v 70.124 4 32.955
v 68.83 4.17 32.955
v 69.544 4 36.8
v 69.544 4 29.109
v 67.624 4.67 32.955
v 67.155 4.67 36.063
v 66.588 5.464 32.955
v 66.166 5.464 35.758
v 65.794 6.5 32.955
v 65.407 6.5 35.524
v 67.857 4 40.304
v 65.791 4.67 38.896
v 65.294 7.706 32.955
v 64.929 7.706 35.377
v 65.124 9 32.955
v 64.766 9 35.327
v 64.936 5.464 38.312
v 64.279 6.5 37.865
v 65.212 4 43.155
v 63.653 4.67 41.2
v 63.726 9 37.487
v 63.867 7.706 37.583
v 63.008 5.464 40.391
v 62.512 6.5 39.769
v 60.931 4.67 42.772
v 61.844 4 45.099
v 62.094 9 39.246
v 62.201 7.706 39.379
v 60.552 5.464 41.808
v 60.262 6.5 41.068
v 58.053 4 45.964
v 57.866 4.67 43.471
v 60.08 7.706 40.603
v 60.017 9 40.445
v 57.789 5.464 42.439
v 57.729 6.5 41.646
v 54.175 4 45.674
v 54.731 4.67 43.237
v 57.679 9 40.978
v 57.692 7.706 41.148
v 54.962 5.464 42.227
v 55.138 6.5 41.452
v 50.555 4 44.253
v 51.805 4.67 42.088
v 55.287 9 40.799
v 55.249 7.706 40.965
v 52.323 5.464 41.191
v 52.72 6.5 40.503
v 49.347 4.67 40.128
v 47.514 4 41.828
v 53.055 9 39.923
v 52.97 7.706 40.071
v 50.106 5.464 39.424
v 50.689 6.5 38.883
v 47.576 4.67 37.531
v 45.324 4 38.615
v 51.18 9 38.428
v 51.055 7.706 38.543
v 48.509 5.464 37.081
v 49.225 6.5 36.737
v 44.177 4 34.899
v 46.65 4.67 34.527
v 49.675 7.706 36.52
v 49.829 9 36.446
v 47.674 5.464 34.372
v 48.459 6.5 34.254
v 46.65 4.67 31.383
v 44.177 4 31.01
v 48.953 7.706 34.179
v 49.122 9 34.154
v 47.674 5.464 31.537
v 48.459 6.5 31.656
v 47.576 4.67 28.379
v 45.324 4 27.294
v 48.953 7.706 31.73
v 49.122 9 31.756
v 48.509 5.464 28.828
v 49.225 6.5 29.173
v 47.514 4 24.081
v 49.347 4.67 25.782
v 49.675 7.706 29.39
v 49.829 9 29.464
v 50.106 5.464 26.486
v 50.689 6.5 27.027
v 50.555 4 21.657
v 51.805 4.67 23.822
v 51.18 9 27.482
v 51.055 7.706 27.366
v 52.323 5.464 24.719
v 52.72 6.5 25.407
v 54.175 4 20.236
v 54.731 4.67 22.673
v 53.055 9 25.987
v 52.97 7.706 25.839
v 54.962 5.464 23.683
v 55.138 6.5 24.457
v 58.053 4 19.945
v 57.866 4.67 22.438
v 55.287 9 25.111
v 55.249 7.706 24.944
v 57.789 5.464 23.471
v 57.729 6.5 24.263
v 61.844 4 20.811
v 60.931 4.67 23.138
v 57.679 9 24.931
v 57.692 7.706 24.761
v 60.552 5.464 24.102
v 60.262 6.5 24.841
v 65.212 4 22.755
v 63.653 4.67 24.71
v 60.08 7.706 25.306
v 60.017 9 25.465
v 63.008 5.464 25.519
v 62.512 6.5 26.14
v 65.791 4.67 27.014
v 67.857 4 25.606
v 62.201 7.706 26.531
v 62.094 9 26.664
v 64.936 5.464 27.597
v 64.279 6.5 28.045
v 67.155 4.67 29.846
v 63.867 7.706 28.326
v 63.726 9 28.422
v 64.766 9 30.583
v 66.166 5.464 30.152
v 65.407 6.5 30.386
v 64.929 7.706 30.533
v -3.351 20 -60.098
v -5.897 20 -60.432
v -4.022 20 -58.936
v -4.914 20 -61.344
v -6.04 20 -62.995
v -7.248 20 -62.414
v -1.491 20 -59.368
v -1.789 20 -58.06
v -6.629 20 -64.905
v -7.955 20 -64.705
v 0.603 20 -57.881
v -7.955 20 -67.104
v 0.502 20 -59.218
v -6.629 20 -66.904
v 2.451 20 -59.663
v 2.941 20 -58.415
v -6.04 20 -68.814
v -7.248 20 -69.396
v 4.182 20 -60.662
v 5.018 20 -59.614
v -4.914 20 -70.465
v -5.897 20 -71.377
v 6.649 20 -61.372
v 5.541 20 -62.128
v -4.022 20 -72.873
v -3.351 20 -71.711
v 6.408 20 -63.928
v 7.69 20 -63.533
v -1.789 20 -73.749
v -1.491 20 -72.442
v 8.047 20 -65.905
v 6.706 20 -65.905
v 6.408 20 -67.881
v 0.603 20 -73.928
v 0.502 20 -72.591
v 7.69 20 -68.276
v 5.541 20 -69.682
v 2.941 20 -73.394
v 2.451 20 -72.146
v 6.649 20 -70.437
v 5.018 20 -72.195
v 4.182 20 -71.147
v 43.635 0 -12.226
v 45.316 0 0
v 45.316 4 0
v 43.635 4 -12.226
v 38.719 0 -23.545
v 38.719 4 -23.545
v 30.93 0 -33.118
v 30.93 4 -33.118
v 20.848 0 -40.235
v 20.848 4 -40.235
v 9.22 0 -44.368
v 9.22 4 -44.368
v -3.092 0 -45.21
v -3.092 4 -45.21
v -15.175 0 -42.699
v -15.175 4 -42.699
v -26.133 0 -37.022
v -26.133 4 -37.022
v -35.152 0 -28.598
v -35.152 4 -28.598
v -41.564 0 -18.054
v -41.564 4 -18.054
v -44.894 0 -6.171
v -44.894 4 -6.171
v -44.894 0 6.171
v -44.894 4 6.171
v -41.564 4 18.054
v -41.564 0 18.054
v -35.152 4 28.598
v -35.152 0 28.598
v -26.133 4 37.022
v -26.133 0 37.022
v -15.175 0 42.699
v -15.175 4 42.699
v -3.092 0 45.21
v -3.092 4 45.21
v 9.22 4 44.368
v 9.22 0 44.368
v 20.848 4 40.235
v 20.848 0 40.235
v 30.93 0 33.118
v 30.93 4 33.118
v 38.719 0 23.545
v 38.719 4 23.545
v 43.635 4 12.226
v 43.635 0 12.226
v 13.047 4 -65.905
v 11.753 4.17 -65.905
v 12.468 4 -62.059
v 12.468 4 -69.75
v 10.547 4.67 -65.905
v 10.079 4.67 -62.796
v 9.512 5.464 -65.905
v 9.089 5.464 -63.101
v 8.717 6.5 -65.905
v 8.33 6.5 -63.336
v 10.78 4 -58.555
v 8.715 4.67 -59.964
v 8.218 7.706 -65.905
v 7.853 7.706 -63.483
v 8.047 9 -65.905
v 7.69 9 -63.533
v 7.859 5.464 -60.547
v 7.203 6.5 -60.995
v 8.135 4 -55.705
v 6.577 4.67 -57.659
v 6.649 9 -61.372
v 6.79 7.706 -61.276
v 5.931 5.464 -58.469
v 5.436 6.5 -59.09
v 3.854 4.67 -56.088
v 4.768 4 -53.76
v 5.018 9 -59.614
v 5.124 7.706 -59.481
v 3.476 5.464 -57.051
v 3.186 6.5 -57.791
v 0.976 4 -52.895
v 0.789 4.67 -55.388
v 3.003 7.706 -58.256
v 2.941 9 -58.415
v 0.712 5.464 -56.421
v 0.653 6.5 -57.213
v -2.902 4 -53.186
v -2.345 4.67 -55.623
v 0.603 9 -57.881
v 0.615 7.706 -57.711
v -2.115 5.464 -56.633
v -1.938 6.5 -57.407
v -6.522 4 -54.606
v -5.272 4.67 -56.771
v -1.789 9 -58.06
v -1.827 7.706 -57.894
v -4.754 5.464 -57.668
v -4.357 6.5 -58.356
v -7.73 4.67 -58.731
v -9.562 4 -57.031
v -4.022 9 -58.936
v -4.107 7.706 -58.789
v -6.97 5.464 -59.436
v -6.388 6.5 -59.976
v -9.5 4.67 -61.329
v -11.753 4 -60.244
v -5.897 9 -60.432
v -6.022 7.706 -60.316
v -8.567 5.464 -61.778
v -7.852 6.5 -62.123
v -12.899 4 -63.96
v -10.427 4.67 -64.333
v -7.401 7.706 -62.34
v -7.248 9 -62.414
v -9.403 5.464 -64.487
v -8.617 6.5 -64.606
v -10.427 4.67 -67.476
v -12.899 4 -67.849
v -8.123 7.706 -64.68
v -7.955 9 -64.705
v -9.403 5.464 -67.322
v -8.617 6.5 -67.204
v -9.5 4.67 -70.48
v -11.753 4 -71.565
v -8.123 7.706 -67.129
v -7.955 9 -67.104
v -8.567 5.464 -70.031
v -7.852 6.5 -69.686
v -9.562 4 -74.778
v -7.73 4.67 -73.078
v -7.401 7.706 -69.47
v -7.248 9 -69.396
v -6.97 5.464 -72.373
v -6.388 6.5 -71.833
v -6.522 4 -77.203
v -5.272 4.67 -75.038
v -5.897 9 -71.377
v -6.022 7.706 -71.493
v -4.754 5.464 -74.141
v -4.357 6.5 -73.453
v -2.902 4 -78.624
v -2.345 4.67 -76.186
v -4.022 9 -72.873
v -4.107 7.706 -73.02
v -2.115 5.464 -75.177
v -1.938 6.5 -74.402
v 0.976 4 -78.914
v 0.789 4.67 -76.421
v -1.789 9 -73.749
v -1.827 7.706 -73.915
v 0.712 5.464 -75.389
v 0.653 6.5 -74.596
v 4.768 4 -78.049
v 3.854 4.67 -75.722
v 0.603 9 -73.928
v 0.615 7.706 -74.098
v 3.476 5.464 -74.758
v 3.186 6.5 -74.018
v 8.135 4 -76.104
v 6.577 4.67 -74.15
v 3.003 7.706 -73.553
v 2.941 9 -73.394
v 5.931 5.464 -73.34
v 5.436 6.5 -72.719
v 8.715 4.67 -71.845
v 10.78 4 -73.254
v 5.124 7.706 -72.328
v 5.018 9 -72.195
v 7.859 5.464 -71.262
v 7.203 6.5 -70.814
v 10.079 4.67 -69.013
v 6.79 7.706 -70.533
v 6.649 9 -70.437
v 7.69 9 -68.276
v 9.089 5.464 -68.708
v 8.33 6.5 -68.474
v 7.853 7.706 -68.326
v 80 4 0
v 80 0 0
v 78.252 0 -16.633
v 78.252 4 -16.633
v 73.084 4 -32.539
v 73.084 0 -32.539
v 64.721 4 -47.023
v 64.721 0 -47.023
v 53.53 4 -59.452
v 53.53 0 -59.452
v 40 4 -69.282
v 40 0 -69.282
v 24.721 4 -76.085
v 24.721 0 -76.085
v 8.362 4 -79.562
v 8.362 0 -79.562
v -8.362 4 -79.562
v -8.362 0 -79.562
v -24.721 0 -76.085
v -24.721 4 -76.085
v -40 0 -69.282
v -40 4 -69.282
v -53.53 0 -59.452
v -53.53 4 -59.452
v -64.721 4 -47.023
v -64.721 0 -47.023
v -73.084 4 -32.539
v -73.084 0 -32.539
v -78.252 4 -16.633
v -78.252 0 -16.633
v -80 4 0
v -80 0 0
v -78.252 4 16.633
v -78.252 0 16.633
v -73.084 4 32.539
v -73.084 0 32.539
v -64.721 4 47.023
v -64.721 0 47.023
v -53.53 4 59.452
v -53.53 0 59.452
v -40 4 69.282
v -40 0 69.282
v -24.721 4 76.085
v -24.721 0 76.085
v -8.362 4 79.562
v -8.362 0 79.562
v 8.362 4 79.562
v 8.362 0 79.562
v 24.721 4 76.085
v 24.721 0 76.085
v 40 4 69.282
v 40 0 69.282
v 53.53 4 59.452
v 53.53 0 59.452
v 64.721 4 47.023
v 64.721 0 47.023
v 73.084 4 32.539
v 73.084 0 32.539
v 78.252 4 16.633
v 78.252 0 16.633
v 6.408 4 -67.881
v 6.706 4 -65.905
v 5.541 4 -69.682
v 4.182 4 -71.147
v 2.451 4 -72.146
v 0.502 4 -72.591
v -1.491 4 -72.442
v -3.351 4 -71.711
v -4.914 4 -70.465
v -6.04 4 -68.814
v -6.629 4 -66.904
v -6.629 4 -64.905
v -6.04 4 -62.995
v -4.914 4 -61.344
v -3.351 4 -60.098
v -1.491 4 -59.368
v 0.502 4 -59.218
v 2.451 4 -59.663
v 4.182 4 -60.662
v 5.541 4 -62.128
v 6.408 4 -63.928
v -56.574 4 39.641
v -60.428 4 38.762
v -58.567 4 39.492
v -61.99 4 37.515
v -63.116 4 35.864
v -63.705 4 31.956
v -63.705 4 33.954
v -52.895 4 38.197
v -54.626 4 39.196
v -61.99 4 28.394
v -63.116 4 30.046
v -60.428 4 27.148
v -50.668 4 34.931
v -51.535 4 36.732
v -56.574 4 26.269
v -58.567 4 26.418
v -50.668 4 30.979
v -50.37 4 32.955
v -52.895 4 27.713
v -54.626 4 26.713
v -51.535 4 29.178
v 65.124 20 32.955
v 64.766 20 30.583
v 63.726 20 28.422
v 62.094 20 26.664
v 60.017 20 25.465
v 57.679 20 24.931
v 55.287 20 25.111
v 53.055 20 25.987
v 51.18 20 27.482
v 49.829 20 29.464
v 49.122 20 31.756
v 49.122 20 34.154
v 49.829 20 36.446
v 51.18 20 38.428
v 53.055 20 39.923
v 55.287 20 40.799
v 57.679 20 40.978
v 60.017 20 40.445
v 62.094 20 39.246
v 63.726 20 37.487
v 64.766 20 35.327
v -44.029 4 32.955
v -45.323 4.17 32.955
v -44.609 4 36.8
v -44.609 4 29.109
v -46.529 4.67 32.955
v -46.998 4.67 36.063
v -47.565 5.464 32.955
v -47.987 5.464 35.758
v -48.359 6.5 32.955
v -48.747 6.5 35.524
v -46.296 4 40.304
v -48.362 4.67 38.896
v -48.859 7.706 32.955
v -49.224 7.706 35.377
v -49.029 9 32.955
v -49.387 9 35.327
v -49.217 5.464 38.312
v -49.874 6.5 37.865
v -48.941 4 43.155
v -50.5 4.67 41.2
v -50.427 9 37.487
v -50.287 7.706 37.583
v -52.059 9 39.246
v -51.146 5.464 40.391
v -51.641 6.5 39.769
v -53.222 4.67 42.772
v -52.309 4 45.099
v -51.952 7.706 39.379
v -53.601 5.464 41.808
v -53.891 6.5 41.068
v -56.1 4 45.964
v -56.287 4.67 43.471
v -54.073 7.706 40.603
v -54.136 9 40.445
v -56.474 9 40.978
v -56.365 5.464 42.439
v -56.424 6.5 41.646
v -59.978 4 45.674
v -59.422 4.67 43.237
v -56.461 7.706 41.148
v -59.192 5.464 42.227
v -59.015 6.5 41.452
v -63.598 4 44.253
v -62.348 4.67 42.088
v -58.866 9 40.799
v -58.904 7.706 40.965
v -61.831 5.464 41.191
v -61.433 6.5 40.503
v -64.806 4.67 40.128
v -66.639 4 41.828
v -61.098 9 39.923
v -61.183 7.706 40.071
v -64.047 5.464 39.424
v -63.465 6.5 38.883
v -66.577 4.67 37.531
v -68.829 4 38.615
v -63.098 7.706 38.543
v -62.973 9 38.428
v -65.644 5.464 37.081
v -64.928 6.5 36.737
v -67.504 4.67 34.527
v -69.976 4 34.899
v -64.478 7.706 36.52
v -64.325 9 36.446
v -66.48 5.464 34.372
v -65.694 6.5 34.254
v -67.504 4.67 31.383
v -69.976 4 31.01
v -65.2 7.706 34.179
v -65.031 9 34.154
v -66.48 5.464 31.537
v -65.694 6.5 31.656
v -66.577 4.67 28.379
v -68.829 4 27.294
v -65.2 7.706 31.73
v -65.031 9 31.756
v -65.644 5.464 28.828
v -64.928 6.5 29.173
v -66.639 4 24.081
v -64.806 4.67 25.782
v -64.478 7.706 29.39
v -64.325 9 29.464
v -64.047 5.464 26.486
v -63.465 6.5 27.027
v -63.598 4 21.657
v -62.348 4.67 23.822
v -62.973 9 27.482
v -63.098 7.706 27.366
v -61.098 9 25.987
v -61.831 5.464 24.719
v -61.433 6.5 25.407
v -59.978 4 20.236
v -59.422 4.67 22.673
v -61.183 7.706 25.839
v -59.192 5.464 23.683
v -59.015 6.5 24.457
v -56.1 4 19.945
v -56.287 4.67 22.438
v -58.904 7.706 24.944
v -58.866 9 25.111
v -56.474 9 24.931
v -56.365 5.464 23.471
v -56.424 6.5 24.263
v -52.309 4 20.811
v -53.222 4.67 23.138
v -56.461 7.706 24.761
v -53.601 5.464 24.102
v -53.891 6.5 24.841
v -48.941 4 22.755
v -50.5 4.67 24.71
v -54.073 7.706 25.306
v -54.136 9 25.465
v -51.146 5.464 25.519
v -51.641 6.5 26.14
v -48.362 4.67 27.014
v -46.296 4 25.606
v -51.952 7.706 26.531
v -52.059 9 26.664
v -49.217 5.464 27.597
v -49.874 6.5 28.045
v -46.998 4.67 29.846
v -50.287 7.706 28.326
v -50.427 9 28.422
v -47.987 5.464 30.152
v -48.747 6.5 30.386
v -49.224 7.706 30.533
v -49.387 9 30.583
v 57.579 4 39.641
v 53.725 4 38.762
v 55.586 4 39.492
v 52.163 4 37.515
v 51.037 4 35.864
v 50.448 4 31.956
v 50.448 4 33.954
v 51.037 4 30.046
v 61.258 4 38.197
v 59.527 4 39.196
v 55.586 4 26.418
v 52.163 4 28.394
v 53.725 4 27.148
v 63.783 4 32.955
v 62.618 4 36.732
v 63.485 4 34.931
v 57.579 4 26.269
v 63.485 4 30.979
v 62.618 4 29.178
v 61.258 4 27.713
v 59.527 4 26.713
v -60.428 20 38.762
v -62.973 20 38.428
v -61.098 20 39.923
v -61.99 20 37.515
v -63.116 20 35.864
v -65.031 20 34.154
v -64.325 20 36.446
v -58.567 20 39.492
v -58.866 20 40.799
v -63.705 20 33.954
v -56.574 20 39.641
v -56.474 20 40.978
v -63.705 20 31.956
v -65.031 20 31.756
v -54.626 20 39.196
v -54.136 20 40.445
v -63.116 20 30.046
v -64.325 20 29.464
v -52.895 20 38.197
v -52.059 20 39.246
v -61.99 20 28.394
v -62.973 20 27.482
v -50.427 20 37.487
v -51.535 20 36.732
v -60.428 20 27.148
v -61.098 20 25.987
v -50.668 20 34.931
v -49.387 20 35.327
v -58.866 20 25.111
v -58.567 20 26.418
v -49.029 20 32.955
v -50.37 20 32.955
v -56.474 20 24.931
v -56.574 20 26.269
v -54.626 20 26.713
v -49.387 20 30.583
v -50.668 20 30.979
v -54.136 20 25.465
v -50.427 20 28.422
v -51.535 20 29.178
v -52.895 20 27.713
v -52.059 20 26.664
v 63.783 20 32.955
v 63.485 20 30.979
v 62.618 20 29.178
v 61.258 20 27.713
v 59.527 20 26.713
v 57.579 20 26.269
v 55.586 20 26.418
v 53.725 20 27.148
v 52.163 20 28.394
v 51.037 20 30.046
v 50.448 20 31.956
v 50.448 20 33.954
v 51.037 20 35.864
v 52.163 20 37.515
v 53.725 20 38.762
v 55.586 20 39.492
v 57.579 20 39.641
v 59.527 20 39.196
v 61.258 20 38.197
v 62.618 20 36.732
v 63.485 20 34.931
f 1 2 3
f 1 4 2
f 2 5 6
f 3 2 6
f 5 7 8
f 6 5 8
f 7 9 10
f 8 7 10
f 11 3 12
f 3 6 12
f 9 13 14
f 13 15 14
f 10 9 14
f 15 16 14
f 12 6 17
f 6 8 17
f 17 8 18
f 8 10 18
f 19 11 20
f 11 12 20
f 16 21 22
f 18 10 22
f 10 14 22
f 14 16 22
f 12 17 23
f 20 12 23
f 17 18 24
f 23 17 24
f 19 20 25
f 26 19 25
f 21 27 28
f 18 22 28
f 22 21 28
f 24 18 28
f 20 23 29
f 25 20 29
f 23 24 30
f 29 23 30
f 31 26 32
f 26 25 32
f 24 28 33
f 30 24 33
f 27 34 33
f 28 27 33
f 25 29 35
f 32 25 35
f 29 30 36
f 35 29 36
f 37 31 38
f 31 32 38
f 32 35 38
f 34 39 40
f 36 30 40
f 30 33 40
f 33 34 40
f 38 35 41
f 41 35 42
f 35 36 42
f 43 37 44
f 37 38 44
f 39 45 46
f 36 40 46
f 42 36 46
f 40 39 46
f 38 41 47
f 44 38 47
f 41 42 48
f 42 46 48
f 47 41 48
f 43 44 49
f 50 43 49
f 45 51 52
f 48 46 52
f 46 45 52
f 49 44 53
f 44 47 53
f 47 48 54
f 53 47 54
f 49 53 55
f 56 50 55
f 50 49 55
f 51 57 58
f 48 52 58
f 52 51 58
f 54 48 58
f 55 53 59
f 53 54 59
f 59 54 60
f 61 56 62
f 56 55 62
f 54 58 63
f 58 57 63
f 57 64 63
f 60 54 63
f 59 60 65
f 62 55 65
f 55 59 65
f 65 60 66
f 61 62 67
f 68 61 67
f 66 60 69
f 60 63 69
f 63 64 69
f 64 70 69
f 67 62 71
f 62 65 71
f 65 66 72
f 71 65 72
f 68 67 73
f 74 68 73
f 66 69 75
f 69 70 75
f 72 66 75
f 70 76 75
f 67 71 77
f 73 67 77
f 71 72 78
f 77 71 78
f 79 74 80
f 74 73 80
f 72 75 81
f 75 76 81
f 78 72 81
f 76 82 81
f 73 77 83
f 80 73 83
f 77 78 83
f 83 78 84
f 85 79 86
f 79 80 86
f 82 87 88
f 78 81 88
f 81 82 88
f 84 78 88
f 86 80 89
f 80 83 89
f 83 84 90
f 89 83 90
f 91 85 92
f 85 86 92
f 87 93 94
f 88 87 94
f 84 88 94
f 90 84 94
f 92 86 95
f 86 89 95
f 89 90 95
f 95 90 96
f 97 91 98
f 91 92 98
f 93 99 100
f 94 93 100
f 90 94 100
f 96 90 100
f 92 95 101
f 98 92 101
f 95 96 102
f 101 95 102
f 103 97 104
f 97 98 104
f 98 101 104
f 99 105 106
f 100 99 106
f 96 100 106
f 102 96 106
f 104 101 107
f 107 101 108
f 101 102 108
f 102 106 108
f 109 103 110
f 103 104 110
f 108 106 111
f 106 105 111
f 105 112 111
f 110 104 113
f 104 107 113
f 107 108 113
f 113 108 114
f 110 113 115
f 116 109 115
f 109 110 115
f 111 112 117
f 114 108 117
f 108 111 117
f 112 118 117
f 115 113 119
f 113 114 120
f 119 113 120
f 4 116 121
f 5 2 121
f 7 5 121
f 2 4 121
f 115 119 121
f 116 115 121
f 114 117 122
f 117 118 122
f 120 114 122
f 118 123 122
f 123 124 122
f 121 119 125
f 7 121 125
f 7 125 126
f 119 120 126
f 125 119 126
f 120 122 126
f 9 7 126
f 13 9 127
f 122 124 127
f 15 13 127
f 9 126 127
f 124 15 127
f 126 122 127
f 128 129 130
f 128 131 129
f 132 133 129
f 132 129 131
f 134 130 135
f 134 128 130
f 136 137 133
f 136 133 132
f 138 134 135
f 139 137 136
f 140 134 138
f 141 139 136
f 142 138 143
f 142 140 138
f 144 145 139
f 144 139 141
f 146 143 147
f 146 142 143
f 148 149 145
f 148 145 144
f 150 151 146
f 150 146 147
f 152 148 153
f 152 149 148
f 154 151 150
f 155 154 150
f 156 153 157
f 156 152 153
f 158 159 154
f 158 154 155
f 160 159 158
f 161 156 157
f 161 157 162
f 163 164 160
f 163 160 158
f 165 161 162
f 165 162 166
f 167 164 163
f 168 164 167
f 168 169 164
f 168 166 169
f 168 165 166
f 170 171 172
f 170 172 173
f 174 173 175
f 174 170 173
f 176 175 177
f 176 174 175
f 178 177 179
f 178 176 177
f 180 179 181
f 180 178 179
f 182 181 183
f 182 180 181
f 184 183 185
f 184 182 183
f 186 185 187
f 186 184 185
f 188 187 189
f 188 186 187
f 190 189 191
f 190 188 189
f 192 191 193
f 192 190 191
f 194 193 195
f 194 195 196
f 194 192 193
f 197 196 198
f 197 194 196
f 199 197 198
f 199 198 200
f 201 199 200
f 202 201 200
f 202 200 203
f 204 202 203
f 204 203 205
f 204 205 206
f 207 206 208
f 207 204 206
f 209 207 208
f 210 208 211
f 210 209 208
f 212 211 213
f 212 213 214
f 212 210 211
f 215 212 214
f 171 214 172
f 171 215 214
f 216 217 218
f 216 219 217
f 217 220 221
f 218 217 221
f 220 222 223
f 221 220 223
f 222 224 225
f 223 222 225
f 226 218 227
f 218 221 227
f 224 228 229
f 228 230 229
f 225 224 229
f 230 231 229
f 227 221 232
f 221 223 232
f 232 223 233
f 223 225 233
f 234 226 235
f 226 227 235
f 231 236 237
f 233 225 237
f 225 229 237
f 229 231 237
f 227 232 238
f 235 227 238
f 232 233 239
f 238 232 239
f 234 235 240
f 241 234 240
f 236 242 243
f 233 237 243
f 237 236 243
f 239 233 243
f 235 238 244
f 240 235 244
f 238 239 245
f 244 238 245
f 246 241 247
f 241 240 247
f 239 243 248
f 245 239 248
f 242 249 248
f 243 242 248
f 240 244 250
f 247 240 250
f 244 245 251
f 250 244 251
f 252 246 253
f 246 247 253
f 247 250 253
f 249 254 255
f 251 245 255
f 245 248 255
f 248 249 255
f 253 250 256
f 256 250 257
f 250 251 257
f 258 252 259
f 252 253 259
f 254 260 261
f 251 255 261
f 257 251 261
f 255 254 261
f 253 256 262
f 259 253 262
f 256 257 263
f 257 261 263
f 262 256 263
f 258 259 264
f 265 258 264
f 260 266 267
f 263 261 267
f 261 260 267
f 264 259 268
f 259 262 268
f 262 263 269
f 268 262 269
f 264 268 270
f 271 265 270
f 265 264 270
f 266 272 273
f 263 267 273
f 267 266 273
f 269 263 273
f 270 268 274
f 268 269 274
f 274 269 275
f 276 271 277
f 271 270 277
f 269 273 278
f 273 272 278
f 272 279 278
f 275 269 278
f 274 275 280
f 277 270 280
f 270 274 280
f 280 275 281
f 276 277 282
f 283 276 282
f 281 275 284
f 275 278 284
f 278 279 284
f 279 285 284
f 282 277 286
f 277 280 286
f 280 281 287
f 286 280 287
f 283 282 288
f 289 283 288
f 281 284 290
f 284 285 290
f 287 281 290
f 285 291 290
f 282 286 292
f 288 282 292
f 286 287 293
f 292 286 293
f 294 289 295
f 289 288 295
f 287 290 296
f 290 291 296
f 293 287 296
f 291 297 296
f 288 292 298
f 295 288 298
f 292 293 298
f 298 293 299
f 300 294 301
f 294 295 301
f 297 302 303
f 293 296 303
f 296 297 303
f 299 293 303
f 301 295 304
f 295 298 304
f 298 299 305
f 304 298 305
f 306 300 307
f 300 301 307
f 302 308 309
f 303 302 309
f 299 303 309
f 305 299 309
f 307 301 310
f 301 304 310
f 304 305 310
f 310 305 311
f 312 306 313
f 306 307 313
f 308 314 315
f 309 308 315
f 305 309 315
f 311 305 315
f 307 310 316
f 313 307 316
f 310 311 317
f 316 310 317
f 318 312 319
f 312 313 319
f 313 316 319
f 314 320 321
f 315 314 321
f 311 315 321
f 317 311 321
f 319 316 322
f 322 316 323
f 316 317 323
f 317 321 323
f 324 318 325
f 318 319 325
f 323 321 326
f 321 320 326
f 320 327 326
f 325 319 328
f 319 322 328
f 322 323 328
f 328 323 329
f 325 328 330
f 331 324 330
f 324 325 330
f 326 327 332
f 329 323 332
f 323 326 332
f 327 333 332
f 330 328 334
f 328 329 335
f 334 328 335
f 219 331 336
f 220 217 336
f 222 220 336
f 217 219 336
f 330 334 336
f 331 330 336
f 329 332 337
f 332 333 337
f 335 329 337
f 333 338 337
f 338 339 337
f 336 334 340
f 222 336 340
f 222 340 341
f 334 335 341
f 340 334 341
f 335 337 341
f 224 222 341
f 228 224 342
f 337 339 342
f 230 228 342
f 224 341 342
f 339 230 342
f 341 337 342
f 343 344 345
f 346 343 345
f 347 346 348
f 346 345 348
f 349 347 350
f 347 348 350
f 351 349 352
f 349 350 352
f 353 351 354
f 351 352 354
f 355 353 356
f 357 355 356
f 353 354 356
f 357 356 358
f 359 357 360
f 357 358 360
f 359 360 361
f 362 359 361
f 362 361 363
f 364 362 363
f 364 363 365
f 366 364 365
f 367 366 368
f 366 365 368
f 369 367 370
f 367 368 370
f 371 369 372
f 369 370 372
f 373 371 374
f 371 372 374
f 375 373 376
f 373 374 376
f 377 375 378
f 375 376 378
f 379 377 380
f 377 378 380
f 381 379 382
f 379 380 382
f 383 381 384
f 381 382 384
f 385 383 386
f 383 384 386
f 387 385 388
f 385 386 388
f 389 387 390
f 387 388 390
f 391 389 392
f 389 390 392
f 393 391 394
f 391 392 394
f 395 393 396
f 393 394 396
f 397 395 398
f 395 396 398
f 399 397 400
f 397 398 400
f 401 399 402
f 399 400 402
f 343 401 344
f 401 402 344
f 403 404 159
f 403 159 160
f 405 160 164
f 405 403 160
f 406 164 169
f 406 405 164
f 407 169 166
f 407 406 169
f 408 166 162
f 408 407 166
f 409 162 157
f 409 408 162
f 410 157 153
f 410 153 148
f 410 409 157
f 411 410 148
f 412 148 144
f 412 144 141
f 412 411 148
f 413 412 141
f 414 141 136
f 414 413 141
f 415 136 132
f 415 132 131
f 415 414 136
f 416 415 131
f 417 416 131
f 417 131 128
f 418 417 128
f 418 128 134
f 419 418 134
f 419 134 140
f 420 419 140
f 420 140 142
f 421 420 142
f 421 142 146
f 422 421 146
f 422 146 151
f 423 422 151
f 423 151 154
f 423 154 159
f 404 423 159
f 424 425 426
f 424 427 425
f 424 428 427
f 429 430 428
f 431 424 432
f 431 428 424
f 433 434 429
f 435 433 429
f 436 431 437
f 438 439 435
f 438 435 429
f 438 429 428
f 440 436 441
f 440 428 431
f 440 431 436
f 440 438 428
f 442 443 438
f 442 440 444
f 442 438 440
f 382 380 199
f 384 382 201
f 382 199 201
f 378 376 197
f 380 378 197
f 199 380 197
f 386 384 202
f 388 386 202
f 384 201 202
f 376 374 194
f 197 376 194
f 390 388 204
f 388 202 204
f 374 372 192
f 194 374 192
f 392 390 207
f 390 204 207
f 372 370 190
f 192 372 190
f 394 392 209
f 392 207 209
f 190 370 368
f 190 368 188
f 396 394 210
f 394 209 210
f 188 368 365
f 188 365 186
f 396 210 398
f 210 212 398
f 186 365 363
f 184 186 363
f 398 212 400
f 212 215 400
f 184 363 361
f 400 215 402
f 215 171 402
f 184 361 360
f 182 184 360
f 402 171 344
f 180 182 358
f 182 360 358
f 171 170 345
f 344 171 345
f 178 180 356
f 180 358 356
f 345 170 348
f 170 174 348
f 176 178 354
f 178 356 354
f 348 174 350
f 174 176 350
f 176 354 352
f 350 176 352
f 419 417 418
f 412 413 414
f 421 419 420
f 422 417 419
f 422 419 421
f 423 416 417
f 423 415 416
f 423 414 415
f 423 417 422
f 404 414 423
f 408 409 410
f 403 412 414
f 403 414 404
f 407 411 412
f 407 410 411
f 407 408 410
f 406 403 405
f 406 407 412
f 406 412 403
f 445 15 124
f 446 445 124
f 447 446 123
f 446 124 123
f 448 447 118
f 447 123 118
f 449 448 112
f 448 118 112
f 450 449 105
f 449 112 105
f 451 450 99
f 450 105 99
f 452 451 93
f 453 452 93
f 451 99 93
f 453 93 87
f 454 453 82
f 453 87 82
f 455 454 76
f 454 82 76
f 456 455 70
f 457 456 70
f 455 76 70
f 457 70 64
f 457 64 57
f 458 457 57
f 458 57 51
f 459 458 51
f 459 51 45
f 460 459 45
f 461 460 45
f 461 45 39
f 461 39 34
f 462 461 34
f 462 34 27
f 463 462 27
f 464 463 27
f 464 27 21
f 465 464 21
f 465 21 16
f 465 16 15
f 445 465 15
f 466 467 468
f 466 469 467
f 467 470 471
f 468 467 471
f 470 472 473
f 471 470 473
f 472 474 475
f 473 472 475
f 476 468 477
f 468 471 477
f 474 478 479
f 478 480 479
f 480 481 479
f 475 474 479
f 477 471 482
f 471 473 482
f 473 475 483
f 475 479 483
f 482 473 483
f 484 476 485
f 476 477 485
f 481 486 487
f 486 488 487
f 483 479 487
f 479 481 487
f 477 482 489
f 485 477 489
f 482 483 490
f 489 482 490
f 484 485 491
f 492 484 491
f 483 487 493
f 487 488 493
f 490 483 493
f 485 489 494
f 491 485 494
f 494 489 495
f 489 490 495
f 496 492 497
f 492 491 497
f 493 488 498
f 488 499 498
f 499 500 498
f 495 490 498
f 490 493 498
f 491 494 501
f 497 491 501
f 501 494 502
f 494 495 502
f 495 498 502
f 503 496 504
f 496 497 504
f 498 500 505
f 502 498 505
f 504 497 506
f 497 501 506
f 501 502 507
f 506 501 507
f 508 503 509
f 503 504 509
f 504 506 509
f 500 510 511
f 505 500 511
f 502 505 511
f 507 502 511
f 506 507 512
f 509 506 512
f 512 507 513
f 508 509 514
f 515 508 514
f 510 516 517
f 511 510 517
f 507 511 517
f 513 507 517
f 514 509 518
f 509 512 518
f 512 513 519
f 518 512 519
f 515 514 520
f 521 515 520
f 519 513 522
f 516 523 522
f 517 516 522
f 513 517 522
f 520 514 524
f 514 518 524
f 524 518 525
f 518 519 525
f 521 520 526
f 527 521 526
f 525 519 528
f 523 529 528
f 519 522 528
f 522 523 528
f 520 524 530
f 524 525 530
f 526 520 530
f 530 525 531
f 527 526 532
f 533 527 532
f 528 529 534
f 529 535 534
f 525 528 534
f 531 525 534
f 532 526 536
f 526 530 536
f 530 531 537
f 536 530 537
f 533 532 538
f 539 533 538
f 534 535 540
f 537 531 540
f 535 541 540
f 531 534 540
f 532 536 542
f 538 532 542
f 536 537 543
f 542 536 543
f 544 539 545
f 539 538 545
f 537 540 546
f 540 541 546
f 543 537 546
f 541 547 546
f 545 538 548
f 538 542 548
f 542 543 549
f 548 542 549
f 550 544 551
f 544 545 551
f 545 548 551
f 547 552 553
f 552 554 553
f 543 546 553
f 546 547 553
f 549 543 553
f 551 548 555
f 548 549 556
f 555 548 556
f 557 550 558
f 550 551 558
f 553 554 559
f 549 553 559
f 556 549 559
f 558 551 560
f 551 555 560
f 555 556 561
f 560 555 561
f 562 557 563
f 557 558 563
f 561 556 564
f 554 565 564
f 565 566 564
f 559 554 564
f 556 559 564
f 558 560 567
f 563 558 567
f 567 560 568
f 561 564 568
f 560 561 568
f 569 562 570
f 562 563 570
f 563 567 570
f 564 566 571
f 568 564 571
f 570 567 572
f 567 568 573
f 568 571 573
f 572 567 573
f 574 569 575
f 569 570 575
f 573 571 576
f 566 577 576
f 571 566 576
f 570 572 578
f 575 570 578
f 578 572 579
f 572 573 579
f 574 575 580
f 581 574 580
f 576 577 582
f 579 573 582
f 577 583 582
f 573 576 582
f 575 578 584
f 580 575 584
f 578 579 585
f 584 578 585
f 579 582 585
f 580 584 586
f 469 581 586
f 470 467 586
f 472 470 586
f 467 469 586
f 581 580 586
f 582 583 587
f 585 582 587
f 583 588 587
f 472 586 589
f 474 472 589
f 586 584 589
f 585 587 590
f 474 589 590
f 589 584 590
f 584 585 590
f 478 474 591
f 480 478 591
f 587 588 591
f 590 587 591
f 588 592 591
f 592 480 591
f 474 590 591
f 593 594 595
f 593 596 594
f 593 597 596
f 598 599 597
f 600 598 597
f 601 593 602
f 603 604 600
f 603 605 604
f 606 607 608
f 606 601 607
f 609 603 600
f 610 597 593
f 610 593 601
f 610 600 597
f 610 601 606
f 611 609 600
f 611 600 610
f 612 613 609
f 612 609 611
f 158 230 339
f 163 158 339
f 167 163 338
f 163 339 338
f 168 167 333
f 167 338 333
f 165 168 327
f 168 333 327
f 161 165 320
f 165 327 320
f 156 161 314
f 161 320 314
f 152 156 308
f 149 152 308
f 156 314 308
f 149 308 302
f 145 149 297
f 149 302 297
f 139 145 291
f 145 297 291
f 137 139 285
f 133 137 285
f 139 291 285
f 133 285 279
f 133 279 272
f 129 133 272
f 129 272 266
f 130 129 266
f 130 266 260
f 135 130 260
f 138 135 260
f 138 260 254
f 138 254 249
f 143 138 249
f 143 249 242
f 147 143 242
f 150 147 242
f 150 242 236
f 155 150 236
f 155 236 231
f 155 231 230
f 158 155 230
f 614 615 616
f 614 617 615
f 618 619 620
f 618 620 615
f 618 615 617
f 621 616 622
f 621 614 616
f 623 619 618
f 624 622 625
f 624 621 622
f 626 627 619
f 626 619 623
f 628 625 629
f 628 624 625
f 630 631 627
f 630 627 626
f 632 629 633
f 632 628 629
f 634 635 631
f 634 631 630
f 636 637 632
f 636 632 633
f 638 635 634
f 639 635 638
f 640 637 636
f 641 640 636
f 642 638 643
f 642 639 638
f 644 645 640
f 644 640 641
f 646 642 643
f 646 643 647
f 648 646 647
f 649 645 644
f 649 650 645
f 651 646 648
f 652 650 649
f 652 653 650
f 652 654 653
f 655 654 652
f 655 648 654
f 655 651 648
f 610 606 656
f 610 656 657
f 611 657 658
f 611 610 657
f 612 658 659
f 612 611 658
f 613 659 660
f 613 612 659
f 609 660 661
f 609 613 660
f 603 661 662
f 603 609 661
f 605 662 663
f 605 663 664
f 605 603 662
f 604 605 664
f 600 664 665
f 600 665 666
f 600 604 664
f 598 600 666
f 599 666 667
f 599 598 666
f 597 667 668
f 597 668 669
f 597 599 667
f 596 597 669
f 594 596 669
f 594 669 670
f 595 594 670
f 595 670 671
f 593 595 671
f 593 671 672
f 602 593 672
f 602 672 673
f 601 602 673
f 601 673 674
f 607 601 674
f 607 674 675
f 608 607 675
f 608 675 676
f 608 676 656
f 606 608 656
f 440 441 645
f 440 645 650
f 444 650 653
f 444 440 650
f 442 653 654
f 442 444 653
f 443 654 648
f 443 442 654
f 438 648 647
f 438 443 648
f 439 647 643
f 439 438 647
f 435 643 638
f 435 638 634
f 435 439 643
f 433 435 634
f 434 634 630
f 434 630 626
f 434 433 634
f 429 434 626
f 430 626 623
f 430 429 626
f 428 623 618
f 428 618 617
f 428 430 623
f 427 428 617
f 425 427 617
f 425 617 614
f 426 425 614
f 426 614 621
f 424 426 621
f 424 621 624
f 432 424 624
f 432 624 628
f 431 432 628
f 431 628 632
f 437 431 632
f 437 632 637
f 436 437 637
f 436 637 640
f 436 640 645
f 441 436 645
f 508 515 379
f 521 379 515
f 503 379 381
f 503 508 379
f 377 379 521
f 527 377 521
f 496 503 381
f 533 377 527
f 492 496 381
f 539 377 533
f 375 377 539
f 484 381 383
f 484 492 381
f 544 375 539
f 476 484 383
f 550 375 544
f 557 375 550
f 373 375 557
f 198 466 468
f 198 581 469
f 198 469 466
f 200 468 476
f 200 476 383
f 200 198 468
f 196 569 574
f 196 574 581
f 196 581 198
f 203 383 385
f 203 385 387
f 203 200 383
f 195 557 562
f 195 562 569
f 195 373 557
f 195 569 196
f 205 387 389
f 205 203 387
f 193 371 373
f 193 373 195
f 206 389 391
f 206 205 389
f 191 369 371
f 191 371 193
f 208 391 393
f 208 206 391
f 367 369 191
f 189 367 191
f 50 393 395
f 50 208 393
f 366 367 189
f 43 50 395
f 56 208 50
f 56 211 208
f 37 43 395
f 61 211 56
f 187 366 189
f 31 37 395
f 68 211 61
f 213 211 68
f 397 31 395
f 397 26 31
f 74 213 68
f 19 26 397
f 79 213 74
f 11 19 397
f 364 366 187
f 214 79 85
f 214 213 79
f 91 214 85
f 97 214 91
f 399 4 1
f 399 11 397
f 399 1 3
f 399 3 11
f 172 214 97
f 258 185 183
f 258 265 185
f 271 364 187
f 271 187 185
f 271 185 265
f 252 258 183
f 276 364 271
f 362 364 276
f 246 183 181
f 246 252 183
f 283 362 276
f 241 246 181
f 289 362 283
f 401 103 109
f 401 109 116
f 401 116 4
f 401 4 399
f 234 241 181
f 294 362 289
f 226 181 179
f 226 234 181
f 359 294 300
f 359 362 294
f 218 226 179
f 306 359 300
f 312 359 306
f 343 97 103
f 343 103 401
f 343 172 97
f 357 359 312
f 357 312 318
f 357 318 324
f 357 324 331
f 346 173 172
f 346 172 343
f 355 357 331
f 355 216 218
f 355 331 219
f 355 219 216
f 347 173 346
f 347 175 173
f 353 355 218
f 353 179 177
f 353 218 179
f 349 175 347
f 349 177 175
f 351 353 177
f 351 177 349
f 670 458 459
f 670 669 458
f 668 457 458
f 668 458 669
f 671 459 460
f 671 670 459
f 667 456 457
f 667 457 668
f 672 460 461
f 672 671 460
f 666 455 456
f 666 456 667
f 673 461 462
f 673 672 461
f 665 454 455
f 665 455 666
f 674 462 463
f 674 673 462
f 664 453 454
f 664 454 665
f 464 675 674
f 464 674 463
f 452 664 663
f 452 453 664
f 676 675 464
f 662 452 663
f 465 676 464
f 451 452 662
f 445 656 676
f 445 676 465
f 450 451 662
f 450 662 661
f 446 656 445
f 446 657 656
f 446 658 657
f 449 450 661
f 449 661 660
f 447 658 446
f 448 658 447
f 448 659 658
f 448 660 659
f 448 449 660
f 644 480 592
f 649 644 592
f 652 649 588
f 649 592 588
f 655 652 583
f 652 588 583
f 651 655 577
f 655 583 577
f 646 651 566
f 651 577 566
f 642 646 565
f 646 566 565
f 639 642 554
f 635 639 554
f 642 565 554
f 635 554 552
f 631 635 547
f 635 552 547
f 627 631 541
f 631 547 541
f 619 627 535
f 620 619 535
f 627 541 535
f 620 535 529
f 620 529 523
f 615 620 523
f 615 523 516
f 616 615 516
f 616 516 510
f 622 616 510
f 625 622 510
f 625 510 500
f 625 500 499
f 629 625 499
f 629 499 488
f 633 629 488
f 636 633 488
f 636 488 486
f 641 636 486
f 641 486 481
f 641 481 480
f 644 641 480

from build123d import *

# Parameters (mm, degrees)
SKETCH4_R           = 80
SKETCH4_R_2         = 45.315839153
BOSS_EXTRUDE1_DEPTH = 4
SKETCH4_3_R         = 8.046061865
SKETCH4_3_R_2       = 6.705051554
BOSS_EXTRUDE2_DEPTH = 20
FILLET1_R           = 5


with BuildPart() as part:
    # Sketch4 → Boss-Extrude1 (new body)
    with BuildSketch(Plane(origin=(0, 0, 0), x_dir=(1, 0, 0), z_dir=(0, 1, 0))):
        Circle(SKETCH4_R)
        Circle(SKETCH4_R_2, mode=Mode.SUBTRACT)
    extrude(amount=BOSS_EXTRUDE1_DEPTH)

    # Sketch4<3> → Boss-Extrude2 (add)
    # profile 1 of 3: a face of its own
    with BuildSketch(Plane(origin=(0, 0, 0), x_dir=(1, 0, 0), z_dir=(0, 1, 0))):
        with Locations((0.001262643, 65.904592273)):
            Circle(SKETCH4_3_R)
        with Locations((0.001262643, 65.904592273)):
            Circle(SKETCH4_3_R_2, mode=Mode.SUBTRACT)
    # profile 2 of 3: a face of its own
    with BuildSketch(Plane(origin=(0, 0, 0), x_dir=(1, 0, 0), z_dir=(0, 1, 0))):
        with Locations((57.077808537, -32.954885136)):
            Circle(SKETCH4_3_R)
        with Locations((57.077808537, -32.954885136)):
            Circle(SKETCH4_3_R_2, mode=Mode.SUBTRACT)
    # profile 3 of 3: a face of its own
    with BuildSketch(Plane(origin=(0, 0, 0), x_dir=(1, 0, 0), z_dir=(0, 1, 0))):
        with Locations((-57.075283251, -32.954885136)):
            Circle(SKETCH4_3_R)
        with Locations((-57.075283251, -32.954885136)):
            Circle(SKETCH4_3_R_2, mode=Mode.SUBTRACT)
    extrude(amount=BOSS_EXTRUDE2_DEPTH)

    # Fillet1
    fillet1_edges = [part.edges().sort_by_distance(p)[0] for p in [
        (49.031746673, 4, 32.954885136),
        (-8.044799222, 4, -65.904592273),
        (-65.121345116, 4, 32.954885136),
    ]]
    fillet(fillet1_edges, radius=FILLET1_R)


solid = part.part
